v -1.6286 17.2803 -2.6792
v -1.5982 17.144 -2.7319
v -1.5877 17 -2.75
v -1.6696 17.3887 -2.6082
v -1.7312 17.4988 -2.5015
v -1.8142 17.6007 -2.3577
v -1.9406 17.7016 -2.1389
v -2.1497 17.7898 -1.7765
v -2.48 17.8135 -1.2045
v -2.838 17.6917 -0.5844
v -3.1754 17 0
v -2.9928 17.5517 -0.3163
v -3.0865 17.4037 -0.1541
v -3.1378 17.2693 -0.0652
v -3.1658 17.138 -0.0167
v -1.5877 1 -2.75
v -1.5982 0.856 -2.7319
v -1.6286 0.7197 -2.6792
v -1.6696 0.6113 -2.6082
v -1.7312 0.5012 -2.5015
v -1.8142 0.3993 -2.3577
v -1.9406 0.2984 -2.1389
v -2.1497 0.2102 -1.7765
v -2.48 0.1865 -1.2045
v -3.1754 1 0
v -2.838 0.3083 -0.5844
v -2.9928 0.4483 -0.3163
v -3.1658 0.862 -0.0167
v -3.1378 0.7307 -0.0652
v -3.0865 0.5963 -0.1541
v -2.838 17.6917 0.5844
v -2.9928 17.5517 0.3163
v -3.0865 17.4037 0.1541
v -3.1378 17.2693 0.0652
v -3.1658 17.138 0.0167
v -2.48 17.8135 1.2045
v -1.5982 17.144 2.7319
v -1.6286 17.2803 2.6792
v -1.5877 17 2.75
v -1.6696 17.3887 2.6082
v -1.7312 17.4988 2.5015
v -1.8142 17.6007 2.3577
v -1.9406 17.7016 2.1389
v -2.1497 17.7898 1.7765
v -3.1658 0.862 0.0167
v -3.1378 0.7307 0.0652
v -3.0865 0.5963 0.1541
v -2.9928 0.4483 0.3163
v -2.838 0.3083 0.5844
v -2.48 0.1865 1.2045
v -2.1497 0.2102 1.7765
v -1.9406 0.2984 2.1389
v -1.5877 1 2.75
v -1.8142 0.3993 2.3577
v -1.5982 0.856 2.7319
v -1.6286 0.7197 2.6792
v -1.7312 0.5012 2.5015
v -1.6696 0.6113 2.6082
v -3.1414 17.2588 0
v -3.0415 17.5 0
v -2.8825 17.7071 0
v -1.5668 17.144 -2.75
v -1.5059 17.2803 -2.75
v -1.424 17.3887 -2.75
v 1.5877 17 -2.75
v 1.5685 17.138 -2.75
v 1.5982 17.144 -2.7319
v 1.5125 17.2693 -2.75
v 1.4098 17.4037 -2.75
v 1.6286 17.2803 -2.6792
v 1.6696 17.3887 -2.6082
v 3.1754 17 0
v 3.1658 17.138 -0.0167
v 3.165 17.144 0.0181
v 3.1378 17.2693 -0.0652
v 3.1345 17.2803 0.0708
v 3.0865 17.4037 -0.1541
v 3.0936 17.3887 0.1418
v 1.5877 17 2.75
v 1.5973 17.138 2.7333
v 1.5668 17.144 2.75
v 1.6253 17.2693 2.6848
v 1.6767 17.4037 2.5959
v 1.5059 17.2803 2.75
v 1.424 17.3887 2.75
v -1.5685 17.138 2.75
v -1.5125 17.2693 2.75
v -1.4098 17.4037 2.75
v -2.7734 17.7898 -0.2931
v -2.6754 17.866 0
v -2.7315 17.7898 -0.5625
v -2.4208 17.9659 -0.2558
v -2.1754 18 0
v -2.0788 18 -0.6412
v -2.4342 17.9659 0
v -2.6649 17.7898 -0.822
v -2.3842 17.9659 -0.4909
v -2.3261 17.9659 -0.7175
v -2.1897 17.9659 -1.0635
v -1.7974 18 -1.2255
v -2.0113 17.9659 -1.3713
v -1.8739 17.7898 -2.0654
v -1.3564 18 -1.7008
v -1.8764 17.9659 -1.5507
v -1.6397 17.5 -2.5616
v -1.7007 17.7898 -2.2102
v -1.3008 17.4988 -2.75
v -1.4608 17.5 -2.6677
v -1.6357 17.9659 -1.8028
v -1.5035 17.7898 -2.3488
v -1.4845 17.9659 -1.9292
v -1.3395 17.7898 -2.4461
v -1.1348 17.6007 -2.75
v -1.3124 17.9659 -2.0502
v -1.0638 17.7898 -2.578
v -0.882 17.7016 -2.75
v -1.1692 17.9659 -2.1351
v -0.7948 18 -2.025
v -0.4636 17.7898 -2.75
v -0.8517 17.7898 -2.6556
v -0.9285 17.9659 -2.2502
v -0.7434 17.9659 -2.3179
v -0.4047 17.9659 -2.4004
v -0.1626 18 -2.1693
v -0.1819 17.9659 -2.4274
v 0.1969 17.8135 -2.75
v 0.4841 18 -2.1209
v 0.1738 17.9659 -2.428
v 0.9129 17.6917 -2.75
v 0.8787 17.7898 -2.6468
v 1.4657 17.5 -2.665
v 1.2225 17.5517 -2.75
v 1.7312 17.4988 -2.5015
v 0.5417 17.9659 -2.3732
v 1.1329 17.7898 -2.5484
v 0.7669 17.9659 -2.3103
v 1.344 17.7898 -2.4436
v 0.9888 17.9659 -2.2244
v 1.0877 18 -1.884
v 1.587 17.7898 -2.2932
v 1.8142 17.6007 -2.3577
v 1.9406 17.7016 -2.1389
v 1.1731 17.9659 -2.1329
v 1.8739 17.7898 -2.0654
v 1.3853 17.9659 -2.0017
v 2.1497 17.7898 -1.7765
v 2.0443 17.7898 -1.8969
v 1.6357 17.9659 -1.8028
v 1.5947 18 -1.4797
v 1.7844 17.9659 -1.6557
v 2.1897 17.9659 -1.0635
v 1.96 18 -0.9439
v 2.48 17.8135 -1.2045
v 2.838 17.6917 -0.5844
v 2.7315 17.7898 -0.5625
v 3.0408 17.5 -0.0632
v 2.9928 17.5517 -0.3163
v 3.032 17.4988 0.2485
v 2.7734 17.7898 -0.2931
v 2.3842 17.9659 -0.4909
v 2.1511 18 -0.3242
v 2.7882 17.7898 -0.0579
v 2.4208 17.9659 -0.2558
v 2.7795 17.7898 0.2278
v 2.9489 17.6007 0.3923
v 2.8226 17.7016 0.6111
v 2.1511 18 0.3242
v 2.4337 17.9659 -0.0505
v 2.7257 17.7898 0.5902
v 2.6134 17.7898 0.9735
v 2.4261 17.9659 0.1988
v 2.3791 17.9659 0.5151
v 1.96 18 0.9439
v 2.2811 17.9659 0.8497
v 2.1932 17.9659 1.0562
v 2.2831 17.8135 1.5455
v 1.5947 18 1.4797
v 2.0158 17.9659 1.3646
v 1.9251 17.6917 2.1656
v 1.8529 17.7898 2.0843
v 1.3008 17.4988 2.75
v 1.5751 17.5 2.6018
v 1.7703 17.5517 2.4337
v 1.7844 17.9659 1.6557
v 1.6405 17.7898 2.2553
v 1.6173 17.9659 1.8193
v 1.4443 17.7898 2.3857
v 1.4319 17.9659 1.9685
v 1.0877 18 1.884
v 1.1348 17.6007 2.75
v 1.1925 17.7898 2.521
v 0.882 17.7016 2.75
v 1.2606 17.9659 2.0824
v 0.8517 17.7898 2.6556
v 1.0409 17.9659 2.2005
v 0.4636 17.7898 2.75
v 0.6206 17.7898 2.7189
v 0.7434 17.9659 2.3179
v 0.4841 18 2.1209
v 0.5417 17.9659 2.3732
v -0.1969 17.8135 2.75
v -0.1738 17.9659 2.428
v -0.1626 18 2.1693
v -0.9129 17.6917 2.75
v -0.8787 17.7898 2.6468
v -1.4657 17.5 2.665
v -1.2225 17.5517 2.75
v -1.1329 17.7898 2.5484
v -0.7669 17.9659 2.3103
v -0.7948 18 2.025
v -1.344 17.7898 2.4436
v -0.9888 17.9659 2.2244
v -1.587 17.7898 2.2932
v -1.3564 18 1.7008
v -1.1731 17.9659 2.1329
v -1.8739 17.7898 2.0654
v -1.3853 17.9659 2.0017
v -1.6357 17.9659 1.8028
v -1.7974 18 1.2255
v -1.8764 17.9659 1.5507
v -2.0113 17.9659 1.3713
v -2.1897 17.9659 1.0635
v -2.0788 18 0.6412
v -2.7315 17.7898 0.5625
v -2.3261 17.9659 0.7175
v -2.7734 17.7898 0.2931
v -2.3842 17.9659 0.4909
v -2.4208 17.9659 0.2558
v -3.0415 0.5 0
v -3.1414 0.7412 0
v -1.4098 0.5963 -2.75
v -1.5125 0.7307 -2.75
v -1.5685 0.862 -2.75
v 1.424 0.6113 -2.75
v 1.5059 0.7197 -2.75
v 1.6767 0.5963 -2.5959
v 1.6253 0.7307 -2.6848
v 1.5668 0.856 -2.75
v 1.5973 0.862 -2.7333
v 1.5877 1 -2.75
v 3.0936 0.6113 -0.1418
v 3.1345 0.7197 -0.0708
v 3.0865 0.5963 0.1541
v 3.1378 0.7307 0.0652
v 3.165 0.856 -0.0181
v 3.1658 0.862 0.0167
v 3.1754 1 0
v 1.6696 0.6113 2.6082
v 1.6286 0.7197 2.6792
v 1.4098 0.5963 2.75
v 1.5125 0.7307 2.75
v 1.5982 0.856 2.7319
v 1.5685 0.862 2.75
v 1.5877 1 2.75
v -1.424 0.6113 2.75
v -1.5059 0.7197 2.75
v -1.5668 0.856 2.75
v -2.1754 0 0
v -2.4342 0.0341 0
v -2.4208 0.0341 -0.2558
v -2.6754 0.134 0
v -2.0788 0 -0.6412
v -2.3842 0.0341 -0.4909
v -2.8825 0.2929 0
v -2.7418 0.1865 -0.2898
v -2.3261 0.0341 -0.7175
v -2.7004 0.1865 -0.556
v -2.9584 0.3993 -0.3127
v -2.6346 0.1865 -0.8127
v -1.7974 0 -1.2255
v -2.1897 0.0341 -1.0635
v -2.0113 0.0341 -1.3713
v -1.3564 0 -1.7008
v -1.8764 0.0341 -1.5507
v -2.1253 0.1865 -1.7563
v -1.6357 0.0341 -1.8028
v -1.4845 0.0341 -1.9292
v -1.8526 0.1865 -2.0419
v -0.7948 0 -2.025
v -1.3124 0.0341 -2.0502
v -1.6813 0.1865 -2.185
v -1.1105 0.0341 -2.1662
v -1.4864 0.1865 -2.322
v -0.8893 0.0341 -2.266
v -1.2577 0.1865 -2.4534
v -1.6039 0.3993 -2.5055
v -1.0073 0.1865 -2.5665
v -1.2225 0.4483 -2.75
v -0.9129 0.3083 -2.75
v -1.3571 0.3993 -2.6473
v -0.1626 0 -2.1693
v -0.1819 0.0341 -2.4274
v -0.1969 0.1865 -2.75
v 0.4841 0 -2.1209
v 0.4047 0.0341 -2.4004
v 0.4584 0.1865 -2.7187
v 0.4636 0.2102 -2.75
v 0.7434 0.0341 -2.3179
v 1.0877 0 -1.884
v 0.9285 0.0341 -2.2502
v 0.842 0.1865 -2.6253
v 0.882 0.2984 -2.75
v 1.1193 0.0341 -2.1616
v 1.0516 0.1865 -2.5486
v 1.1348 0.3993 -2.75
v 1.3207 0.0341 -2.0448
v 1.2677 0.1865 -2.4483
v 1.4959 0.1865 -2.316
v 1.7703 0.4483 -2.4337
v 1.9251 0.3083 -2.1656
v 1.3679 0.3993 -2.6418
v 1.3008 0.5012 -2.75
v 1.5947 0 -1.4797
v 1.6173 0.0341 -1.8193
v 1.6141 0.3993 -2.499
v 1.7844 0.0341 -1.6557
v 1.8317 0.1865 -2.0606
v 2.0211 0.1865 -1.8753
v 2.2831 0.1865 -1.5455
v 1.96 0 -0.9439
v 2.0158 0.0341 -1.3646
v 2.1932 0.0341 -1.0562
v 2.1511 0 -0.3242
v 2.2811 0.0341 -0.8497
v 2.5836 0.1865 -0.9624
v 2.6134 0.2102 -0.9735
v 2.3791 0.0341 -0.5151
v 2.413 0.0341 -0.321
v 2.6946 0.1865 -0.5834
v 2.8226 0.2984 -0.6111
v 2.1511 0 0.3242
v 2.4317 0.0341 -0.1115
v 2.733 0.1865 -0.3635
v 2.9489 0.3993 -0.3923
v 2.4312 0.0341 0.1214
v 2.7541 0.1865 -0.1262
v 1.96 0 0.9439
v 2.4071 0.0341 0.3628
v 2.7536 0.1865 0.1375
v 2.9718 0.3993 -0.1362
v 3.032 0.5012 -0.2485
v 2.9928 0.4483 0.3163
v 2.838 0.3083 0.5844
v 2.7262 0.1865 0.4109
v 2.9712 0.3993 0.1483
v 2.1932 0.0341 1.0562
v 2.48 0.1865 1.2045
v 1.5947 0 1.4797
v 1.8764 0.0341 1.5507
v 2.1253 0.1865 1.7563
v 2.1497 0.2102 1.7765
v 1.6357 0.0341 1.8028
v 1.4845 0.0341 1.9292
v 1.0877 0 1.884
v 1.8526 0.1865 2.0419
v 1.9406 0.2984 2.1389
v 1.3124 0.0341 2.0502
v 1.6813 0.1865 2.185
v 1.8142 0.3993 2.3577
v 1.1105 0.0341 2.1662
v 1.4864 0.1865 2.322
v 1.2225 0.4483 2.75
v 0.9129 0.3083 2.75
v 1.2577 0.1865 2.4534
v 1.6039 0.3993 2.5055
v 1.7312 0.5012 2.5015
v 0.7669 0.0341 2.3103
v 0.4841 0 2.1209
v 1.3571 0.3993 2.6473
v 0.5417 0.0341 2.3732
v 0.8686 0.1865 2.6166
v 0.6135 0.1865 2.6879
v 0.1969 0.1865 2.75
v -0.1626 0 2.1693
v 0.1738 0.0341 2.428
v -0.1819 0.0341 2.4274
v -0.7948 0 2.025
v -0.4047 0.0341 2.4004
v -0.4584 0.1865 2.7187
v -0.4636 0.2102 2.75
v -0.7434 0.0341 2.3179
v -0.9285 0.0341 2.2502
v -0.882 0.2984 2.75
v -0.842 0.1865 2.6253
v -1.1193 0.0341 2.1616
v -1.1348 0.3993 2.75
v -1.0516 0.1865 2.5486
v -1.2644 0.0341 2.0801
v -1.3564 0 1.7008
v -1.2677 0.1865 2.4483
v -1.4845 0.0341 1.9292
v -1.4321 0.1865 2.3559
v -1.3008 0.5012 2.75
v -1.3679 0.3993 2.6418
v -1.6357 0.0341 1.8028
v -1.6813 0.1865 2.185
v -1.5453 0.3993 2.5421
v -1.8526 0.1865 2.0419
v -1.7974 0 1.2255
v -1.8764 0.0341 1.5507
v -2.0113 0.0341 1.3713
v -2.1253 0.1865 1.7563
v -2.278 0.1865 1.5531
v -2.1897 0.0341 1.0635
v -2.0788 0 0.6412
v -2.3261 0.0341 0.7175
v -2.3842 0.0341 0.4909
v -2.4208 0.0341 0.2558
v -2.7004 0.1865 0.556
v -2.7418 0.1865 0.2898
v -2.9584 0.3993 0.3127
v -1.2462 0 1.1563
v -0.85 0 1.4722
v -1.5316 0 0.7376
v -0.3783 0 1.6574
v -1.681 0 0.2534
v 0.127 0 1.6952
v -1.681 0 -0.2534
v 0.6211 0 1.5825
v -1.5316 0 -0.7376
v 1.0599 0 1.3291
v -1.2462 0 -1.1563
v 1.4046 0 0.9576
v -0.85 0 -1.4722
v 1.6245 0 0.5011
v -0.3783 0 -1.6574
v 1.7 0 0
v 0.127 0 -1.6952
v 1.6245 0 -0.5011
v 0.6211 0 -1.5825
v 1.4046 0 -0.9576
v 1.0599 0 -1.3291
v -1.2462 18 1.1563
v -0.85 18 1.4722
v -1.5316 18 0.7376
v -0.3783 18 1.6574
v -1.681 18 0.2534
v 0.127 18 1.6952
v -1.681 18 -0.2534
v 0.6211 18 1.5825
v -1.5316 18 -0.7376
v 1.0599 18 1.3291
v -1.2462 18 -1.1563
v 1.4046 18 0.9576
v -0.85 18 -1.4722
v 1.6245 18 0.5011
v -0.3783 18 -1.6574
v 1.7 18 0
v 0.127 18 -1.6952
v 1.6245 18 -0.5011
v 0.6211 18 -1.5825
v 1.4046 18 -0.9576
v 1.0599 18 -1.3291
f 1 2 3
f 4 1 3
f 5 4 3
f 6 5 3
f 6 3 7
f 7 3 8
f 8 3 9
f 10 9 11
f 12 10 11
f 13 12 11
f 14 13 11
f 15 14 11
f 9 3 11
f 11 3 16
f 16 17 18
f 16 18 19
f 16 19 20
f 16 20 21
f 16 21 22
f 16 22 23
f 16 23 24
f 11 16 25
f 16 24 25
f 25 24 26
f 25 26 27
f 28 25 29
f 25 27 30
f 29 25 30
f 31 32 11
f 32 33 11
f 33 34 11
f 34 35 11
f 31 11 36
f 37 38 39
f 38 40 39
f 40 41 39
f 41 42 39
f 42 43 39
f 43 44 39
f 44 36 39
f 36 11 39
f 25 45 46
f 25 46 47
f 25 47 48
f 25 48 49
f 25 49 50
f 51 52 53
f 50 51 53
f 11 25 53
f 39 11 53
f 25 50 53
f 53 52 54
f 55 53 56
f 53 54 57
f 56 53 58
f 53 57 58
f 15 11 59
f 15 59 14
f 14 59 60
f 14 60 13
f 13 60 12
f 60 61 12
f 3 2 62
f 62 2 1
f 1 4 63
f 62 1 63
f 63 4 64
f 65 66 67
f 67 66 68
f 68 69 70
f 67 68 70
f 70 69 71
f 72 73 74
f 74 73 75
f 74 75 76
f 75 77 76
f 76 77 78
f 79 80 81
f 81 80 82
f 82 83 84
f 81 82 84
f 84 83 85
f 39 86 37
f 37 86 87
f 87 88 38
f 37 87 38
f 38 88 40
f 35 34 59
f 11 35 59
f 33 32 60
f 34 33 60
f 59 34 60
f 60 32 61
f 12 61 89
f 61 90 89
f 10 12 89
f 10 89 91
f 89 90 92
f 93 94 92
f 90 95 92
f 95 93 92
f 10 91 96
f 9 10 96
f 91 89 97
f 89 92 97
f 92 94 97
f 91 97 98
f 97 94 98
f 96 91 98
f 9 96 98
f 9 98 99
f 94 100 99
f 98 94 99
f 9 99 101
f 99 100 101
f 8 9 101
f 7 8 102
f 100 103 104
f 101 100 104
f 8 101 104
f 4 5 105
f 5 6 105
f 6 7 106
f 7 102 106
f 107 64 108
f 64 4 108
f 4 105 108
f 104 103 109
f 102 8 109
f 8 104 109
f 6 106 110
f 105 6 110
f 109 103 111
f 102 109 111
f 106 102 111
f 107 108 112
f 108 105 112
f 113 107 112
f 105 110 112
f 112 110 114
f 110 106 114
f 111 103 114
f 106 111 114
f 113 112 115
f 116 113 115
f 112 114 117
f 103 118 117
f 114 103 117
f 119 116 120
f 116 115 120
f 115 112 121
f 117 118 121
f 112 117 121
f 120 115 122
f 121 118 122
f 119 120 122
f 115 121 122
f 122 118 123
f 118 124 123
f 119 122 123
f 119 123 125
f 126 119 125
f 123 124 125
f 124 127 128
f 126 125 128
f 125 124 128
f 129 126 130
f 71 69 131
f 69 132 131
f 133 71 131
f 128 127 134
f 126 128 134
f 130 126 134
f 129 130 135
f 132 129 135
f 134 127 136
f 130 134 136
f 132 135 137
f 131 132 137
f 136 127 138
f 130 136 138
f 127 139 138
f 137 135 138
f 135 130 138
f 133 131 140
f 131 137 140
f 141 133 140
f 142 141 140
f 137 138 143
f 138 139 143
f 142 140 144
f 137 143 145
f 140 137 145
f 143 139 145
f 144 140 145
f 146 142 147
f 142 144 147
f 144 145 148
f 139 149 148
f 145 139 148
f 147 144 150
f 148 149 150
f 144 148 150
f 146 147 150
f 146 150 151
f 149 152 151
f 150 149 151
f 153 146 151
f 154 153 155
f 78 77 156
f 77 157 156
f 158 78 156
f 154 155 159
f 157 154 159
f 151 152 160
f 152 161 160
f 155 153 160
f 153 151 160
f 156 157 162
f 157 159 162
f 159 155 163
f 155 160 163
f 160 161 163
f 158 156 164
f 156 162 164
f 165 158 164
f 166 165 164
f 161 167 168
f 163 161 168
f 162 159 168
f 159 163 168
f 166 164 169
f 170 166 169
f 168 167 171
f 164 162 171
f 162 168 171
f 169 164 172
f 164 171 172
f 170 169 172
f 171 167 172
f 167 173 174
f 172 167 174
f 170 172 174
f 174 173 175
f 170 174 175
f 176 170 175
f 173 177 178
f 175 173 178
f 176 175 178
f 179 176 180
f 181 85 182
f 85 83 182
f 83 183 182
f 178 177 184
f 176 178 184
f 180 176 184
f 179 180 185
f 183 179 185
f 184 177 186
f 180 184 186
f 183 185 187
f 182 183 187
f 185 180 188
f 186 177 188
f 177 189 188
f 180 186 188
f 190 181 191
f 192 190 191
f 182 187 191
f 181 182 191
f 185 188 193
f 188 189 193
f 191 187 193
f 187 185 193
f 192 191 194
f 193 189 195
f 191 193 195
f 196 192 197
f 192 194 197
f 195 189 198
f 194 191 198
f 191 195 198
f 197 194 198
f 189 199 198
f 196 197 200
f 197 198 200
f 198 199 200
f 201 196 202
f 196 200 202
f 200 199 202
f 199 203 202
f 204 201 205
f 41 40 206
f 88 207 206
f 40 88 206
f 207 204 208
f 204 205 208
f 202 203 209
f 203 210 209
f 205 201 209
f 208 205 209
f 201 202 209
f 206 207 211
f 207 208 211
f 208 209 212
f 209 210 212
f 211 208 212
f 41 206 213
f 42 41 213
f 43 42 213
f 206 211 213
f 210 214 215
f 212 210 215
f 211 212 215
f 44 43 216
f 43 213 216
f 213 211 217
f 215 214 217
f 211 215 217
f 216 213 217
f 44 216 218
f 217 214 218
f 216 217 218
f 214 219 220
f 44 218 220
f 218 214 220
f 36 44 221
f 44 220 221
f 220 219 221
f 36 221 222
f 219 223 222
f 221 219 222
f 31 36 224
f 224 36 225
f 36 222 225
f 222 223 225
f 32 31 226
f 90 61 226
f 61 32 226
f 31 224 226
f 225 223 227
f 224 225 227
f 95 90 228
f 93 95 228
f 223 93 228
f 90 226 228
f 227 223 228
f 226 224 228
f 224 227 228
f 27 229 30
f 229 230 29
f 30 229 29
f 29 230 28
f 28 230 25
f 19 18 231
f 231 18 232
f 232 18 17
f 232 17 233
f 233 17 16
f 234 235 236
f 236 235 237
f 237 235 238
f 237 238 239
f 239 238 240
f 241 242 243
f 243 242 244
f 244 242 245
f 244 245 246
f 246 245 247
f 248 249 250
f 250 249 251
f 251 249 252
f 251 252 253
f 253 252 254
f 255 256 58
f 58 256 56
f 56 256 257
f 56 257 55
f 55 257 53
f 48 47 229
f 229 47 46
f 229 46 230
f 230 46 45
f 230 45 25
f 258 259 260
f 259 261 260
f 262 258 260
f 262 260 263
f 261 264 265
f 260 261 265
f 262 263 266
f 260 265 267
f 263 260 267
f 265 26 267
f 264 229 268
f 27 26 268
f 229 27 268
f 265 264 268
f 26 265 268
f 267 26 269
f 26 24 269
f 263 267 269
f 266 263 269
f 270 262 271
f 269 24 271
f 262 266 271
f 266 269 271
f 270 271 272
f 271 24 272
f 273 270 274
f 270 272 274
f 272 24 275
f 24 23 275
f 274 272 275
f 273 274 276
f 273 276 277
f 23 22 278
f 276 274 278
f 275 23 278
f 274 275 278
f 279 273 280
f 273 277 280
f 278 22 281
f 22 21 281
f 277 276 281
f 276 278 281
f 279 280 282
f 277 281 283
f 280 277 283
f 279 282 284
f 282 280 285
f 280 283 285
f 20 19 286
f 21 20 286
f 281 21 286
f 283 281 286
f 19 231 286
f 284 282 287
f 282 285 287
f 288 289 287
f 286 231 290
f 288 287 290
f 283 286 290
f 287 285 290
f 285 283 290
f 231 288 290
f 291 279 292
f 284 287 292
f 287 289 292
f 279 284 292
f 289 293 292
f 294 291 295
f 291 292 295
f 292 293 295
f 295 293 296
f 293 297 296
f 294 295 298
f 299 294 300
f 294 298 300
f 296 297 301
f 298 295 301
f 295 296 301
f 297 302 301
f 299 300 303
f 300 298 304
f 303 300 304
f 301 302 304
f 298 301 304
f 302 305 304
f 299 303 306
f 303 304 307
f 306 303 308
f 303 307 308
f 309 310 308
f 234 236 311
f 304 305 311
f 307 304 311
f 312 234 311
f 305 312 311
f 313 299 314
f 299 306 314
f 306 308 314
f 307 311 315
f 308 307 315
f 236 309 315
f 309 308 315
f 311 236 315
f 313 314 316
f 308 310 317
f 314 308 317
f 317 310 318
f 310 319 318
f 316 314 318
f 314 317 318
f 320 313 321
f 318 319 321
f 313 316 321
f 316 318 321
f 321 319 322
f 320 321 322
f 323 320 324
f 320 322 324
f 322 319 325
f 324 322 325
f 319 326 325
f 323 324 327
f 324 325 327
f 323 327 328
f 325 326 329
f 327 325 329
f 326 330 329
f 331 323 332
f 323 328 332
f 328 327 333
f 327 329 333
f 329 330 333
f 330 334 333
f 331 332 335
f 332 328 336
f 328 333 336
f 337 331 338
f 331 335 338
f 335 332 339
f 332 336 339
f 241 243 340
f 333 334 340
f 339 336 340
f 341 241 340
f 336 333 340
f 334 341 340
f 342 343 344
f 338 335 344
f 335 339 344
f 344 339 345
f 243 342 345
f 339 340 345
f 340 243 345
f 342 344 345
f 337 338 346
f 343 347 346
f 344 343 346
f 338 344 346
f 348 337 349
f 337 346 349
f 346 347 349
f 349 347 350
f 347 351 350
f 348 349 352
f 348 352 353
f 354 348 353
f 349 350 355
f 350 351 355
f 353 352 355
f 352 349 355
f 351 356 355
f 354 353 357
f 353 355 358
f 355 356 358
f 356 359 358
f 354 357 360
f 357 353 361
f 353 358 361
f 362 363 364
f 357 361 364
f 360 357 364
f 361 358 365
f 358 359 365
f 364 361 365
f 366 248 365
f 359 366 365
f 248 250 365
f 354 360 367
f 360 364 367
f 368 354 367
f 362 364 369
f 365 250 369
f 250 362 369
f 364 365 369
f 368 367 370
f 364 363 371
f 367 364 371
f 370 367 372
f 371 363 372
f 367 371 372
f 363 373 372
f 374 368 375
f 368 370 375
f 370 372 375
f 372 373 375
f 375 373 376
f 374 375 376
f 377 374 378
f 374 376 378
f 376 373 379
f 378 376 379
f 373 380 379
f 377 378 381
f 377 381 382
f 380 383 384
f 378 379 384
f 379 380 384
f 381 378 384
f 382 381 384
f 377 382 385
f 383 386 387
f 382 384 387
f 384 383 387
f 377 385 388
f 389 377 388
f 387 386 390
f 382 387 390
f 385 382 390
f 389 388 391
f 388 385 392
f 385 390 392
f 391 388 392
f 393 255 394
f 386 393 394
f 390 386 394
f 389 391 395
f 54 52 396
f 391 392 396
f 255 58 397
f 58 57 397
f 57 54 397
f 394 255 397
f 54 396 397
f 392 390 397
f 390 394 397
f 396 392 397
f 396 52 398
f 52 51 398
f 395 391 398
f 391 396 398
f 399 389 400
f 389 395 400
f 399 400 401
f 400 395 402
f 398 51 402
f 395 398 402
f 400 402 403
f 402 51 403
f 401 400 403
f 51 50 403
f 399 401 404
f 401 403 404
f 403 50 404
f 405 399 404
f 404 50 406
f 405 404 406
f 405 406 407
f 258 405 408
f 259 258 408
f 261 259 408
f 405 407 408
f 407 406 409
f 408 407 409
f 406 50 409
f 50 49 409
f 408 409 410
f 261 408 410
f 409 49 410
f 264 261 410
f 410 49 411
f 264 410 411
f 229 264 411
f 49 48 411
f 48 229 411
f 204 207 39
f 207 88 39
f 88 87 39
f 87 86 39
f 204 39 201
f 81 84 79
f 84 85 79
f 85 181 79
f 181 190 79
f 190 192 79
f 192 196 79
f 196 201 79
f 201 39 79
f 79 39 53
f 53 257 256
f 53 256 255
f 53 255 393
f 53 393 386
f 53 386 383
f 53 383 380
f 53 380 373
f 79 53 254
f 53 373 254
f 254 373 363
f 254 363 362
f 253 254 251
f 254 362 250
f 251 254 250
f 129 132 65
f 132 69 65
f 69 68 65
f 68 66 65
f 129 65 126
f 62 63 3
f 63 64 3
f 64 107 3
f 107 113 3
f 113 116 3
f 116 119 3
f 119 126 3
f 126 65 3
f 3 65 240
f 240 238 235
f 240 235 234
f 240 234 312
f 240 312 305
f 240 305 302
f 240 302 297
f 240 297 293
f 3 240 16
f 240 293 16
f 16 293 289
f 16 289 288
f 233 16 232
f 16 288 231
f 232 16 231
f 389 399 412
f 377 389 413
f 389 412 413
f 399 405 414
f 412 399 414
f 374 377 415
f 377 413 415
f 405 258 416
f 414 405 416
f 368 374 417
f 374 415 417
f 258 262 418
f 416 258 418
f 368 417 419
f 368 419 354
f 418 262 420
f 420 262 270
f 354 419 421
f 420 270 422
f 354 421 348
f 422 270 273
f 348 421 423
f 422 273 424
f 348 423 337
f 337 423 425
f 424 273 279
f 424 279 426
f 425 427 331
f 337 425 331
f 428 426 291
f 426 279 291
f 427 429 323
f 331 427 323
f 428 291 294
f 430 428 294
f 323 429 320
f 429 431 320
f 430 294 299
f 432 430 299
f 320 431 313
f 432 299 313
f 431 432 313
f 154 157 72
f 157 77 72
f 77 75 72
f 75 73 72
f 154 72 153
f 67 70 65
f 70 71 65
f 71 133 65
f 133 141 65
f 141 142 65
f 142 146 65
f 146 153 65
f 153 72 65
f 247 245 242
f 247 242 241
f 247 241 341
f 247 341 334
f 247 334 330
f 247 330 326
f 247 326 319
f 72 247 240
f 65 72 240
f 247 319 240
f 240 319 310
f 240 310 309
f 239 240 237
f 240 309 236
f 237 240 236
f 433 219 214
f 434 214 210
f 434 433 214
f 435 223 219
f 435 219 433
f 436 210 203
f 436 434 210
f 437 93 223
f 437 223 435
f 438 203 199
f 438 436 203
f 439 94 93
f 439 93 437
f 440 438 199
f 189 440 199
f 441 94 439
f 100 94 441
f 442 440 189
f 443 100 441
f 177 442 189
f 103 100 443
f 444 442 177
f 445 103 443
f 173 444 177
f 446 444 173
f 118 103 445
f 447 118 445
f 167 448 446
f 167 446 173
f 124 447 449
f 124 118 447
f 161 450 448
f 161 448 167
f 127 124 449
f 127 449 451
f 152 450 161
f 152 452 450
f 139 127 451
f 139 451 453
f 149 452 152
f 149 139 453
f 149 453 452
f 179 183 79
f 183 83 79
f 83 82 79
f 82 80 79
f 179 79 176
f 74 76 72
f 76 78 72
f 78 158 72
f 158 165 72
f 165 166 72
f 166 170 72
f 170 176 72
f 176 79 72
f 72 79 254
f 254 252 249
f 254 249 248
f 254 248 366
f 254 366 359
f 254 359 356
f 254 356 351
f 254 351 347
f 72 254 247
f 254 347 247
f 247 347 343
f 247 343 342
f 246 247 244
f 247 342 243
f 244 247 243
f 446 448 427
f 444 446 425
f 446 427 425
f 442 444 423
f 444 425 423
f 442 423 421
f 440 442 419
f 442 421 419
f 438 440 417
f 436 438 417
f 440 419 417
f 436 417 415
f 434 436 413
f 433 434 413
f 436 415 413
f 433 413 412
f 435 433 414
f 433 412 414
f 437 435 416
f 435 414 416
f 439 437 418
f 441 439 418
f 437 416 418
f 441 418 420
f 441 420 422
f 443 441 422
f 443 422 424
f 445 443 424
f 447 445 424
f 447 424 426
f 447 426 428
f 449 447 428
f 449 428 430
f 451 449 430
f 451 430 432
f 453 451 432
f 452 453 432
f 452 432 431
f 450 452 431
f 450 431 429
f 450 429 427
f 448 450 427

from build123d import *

# Parameters (mm, degrees)
BOSS_EXTRUDE1_DEPTH      = 18
M3_CLEARANCE_HOLE1_D     = 3.4
M3_CLEARANCE_HOLE1_DEPTH = 20
M3_CLEARANCE_HOLE1_TIP   = 1.021463052


with BuildPart() as part:
    # Sketch1 → Boss-Extrude1 (new body)
    with BuildSketch(Plane(origin=(0, 0, 0), x_dir=(1, 0, 0), z_dir=(0, 1, 0))):
        Polygon((3.175426481, 0), (1.58771324, 2.75), (-1.58771324, 2.75), (-3.175426481, 0), (-1.58771324, -2.75), (1.58771324, -2.75), align=None)
    extrude(amount=BOSS_EXTRUDE1_DEPTH)

    # M3 Clearance Hole1
    with Locations(Plane(origin=(0, 18, 0), x_dir=(-1, 0, 0), z_dir=(0, 1, 0))):
        with Locations((0, 0)):
            Hole(M3_CLEARANCE_HOLE1_D / 2, depth=M3_CLEARANCE_HOLE1_DEPTH)
            with Locations((0, 0, -(M3_CLEARANCE_HOLE1_DEPTH + M3_CLEARANCE_HOLE1_TIP / 2))):  # 118° drill point
                Cone(0, M3_CLEARANCE_HOLE1_D / 2, M3_CLEARANCE_HOLE1_TIP, mode=Mode.SUBTRACT)

    # Sketch4 → Cut-Revolve1 (revolve, cut)
    with BuildSketch(Plane.XY):
        with BuildLine():
            Line((-2.175426481, 18), (-3.175426481, 18))
            Line((-3.175426481, 18), (-3.175426481, 17))
            ThreePointArc((-3.175426481, 17), (-2.882533262, 17.707106781), (-2.175426481, 18))
        make_face()
        with BuildLine():
            Line((-3.175426481, 1), (-3.175426481, 0))
            Line((-3.175426481, 0), (-2.175426481, 0))
            ThreePointArc((-2.175426481, 0), (-2.882533262, 0.292893219), (-3.175426481, 1))
        make_face()
    revolve(axis=Axis((0, 18, 0), (0, -1, 0)), mode=Mode.SUBTRACT)


solid = part.part
